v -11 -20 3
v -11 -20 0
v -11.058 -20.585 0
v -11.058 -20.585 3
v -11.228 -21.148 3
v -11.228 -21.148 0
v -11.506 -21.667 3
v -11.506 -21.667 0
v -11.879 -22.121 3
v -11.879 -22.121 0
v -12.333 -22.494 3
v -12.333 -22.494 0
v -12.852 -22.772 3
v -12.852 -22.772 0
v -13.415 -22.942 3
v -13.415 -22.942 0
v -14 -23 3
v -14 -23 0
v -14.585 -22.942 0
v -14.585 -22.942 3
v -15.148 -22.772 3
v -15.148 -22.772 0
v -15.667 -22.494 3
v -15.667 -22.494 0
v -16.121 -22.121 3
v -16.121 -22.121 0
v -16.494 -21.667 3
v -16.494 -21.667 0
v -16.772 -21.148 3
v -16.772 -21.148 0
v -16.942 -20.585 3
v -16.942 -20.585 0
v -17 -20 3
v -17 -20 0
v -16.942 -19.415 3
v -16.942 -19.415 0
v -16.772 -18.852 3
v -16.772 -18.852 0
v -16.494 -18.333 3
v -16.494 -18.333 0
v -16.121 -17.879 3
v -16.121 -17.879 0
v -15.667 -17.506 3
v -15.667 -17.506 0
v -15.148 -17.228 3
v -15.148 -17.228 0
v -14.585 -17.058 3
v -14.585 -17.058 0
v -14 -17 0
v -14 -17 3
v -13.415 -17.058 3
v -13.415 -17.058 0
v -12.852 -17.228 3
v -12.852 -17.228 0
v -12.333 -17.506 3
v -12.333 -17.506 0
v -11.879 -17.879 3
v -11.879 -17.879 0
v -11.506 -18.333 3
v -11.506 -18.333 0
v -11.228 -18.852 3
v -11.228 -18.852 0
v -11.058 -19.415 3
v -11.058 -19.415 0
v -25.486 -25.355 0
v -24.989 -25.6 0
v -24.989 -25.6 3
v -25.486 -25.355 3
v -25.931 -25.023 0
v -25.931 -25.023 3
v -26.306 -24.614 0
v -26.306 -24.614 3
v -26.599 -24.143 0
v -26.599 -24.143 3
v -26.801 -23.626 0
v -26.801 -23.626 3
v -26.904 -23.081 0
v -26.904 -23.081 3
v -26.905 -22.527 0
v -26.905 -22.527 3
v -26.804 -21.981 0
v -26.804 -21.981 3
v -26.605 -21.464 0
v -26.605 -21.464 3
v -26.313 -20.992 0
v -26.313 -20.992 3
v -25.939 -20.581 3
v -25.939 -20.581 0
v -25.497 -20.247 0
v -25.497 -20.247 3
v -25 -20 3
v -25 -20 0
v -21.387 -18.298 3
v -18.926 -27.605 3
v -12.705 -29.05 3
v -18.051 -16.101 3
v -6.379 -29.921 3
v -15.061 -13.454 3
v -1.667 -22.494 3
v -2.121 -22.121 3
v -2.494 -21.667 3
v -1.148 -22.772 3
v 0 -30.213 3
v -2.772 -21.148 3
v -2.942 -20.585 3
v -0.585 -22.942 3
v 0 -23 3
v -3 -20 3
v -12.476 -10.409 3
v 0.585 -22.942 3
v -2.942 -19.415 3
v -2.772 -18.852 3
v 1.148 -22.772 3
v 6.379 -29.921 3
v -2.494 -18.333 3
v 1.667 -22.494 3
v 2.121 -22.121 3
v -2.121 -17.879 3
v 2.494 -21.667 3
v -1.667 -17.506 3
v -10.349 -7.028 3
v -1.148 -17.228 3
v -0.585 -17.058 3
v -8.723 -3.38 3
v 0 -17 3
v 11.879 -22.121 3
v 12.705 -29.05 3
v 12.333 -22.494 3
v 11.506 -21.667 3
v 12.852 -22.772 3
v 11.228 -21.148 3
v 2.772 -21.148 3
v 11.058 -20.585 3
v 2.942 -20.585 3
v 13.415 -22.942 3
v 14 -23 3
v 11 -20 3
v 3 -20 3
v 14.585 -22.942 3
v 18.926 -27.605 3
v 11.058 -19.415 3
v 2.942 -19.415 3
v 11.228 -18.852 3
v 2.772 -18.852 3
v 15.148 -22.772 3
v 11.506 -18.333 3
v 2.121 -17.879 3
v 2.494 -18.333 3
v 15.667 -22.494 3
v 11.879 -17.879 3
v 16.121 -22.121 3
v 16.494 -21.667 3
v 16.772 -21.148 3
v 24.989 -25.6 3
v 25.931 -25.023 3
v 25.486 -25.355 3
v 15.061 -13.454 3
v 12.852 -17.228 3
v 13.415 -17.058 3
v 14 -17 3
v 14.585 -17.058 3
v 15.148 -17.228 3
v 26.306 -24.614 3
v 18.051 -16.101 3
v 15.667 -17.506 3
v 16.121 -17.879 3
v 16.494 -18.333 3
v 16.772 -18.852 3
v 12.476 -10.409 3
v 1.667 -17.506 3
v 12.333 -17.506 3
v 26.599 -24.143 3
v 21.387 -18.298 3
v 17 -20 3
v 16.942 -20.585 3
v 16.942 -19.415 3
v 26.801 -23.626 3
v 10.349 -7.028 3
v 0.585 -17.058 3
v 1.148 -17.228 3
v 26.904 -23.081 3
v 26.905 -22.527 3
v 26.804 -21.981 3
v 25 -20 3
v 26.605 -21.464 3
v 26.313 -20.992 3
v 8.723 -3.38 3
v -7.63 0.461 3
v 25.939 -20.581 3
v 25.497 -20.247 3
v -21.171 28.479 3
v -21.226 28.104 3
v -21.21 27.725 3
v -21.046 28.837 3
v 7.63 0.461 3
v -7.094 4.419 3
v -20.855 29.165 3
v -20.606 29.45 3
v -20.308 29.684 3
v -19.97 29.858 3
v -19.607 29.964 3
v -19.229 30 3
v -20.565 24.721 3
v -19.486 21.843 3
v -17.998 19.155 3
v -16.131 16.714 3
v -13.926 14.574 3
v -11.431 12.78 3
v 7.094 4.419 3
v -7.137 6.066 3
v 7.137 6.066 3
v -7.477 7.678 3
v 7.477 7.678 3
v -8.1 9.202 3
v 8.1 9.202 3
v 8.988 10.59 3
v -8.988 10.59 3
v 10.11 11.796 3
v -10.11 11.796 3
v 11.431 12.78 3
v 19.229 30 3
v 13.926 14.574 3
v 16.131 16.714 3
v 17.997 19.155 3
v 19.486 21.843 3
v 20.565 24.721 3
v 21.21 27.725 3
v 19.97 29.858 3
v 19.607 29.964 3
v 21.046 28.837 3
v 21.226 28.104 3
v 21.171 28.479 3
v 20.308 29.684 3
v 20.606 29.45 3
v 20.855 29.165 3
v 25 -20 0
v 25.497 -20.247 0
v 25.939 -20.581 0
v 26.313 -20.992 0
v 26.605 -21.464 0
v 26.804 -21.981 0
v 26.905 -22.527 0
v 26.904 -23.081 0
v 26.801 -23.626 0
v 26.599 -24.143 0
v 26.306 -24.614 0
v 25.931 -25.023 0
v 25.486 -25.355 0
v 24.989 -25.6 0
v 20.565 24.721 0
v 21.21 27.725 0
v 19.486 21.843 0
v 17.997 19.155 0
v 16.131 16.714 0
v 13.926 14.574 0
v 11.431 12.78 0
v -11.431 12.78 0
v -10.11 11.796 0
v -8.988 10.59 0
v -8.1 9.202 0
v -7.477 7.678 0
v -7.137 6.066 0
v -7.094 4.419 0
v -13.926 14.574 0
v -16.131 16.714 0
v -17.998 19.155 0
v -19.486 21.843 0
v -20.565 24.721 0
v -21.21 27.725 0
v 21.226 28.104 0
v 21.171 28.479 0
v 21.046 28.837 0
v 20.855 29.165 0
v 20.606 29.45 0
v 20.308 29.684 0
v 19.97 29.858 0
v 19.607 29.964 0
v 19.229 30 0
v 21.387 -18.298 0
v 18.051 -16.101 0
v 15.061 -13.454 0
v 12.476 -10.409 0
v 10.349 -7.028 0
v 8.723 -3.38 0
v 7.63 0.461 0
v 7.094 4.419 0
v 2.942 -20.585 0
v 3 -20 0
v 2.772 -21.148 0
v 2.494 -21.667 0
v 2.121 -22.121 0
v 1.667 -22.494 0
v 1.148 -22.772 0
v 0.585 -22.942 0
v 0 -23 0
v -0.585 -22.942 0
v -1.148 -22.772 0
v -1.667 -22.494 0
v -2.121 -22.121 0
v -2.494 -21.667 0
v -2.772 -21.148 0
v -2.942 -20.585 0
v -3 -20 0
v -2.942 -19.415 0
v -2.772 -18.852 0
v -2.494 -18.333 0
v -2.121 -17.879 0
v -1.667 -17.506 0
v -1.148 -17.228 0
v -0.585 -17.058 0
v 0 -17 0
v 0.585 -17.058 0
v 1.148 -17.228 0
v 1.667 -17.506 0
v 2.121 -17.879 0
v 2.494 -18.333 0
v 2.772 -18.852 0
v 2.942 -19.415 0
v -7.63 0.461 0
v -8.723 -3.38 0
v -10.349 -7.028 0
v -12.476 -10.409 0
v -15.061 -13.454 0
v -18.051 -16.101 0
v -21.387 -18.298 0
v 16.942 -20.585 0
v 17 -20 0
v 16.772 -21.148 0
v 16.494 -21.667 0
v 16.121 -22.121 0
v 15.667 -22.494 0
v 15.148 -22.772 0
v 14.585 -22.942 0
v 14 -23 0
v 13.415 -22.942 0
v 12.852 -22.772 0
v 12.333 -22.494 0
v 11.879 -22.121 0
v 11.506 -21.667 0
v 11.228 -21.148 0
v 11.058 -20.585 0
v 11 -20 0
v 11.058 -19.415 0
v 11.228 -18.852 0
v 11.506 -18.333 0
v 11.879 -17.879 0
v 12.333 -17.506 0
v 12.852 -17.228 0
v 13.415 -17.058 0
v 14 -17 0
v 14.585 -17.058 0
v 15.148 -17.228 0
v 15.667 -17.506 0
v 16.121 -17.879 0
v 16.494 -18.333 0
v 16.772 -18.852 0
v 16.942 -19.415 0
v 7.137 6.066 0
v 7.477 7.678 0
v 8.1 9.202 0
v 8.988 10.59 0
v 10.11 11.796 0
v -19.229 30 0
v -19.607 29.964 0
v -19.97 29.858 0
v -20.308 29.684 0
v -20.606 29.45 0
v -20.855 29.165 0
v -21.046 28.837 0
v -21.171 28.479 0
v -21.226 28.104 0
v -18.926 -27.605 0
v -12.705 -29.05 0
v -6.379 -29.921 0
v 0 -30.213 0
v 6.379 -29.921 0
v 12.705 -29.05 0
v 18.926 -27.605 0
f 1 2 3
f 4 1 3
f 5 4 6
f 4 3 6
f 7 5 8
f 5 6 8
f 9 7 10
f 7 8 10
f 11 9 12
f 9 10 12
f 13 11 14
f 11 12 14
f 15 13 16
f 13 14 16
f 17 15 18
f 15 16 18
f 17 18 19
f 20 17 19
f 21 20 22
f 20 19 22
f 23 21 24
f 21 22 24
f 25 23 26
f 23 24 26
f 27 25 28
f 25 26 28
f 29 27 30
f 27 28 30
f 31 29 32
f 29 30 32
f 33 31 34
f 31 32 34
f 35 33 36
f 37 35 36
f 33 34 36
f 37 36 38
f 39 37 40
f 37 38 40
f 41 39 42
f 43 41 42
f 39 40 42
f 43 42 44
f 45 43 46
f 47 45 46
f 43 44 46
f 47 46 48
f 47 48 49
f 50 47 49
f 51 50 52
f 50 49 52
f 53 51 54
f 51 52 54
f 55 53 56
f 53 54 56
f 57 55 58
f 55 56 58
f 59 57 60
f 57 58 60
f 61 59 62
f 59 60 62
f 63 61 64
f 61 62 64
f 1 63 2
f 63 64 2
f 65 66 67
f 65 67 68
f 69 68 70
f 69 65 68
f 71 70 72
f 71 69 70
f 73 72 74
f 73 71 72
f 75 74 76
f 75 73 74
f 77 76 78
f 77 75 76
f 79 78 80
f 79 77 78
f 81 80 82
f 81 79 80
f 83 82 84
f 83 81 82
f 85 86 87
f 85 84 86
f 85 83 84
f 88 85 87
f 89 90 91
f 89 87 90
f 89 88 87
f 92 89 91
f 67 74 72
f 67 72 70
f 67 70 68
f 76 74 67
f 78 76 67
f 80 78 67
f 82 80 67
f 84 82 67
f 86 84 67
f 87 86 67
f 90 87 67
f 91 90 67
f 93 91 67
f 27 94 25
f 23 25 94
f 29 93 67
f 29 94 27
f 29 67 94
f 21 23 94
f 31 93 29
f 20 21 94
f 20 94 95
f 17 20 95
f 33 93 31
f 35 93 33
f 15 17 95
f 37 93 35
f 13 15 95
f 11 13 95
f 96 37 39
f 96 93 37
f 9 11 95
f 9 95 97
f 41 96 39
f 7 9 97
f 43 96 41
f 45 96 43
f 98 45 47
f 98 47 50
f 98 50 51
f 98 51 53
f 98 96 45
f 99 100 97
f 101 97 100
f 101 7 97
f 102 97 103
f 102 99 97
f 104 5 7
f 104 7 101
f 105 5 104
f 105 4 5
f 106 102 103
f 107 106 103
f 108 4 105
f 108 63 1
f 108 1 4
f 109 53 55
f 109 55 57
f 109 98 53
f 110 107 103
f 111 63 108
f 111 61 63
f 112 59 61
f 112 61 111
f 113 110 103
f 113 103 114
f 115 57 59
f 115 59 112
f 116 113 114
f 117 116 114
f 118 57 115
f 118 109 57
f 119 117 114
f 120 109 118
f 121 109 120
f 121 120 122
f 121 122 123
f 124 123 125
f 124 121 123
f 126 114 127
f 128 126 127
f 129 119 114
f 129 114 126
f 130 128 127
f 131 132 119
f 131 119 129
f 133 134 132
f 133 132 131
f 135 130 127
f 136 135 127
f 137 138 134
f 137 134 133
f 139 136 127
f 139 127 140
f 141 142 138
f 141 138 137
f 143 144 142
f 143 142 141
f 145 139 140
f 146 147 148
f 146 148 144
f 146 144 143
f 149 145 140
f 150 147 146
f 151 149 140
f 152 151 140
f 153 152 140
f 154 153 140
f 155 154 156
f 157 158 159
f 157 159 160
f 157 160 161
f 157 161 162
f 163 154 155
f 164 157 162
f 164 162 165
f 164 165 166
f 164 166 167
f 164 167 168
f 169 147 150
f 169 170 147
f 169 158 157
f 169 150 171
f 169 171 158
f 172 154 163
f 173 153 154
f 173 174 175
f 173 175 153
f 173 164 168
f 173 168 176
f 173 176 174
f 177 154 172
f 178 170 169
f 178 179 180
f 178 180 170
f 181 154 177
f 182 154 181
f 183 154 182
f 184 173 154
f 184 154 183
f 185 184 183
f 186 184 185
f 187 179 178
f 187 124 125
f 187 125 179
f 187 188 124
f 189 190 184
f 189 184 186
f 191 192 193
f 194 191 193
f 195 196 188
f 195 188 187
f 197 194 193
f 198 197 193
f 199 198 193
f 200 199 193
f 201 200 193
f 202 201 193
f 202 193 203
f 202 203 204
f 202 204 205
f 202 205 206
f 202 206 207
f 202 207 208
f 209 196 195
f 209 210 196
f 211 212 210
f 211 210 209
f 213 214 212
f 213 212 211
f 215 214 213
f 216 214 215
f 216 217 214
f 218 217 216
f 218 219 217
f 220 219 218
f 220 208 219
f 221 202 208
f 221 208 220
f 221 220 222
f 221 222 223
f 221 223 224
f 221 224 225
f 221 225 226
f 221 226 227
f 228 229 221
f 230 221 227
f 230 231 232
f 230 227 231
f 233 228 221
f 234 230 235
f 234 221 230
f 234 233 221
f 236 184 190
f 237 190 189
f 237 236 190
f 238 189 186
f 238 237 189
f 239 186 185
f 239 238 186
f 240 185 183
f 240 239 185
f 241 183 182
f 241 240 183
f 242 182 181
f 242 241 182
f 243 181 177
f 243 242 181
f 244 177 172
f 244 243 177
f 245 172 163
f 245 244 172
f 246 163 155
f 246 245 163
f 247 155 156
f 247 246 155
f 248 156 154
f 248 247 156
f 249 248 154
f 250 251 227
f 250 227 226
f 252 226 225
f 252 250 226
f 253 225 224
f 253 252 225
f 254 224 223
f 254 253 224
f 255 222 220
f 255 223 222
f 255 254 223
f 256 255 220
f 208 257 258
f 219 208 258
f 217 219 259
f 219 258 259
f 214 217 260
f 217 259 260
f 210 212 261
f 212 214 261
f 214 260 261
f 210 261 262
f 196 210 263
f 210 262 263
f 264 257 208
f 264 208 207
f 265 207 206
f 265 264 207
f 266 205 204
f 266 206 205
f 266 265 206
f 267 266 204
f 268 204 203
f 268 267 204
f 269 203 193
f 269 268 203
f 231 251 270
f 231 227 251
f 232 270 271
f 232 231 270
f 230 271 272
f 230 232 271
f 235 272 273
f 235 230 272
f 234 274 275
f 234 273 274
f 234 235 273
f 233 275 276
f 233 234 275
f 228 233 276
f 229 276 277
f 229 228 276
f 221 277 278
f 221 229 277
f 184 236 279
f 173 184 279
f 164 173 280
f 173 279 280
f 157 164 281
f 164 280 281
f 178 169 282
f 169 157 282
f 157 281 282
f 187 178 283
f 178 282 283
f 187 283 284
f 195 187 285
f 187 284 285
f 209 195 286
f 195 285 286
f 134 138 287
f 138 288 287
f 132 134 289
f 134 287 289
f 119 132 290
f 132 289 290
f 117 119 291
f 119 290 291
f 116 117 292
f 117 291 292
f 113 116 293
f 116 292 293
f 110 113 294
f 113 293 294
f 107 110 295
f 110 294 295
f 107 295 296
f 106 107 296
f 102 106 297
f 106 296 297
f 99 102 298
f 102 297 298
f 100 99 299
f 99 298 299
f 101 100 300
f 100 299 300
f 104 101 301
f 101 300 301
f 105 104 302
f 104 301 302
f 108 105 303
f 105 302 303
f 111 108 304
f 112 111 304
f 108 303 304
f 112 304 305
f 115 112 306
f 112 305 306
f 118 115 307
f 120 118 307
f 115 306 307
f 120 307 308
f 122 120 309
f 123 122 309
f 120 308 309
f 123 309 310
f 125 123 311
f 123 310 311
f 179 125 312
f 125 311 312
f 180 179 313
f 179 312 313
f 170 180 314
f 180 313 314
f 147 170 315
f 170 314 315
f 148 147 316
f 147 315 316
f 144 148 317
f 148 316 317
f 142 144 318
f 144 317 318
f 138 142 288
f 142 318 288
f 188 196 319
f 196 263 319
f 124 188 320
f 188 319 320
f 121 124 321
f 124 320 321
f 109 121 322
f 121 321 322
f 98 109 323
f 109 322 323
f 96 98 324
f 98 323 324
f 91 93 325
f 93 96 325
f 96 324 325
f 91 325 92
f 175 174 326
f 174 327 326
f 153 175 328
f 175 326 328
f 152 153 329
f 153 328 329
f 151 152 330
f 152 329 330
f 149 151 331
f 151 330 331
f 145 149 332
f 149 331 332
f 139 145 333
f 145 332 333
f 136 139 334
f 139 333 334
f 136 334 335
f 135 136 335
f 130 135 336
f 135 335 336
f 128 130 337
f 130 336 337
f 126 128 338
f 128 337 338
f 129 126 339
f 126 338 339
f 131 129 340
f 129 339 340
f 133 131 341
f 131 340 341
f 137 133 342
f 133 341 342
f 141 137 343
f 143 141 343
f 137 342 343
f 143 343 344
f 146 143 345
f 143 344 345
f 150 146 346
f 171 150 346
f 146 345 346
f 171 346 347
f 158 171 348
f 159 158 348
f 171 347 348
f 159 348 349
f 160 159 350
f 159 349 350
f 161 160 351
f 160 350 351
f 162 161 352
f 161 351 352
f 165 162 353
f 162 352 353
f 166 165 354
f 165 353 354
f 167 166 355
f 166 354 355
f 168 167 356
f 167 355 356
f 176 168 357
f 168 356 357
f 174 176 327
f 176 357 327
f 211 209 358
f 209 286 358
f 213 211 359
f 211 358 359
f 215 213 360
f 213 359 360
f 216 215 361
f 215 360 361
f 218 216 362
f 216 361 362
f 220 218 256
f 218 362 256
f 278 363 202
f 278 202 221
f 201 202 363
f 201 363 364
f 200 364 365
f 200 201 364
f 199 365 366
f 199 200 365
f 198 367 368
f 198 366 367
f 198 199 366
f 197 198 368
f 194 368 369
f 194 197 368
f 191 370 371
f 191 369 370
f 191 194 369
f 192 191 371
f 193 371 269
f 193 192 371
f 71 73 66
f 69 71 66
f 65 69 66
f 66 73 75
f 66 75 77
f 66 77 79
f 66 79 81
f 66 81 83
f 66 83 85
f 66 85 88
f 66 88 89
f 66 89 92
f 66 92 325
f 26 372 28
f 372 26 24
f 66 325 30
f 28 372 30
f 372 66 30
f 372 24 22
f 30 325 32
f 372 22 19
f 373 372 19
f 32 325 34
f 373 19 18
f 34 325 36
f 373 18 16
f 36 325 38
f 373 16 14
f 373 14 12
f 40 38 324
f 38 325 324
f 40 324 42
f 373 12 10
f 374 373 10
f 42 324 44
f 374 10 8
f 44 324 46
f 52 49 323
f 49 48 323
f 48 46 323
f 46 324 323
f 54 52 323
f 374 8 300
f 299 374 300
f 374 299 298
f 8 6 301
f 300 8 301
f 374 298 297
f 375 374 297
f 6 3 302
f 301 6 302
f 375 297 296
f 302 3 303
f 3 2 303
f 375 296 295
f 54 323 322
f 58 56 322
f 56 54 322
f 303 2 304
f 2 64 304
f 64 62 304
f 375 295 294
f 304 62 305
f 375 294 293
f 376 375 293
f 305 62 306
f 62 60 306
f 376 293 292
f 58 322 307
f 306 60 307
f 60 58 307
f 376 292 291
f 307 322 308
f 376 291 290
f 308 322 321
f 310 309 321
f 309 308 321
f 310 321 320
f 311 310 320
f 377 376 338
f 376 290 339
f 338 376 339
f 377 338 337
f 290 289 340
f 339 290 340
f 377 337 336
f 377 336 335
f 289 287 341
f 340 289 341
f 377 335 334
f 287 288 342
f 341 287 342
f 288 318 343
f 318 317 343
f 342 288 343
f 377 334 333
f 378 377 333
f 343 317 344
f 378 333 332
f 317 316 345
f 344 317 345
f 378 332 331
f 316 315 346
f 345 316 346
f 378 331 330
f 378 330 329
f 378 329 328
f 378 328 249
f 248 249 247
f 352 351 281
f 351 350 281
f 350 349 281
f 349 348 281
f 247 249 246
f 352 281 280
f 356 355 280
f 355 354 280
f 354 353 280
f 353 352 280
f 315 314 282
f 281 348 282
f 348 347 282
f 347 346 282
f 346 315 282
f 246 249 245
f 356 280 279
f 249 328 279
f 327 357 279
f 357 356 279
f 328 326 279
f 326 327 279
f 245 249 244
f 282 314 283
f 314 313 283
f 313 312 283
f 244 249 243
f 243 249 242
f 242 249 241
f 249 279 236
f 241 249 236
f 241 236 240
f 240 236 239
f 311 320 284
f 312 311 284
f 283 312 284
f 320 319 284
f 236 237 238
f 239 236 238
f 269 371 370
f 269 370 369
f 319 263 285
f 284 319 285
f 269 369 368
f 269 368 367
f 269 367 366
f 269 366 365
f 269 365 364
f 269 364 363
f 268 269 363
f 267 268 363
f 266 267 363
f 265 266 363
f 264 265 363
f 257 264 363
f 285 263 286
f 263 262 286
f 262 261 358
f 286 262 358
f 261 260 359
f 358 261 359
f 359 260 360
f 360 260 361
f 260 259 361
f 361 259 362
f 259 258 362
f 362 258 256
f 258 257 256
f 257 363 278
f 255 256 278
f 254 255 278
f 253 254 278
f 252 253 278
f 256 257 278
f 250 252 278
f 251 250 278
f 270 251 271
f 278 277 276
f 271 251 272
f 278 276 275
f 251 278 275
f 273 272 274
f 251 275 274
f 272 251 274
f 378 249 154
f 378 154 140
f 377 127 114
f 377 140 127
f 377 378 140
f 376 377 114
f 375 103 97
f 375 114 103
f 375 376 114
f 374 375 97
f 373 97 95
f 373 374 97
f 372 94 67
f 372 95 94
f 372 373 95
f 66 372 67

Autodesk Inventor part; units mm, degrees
ref_plane "YZ Plane" through (0, 0, 0) normal (1, 0, 0) x (0, 1, 0)
ref_plane "XZ Plane" through (0, 0, 0) normal (0, 1, 0) x (-1, 0, 0)
ref_plane "XY Plane" through (0, 0, 0) normal (0, 0, 1) x (1, 0, 0)
sketch "Sketch1" plane through (0, 0, 0) normal (0, 0, 1) x (1, 0, 0)
  circle A0 centre (16.2, 5) radius 9.025
  arc A1 (15.9625, 14.0219) -> (35.7029, 29.6112) centre (15.41, 35.0146) ccw
  arc A2 (8.6866, 0) -> (52.5133, -3.5421) centre (31.9968, 15.5125) ccw
  circle A3 centre (16.2, 5) radius 6.025
  arc A4 (70.0205, 42.4797) -> (35.7029, 29.6112) centre (57.4454, 23.8218) ccw
  circle A5 centre (14, -20) radius 3
  circle A6 centre (0, -20) radius 3
  circle A7 centre (-14, -20) radius 3
  line L0 (16.2, 5) -> (136.0469, 5) construction
  line L1 (16.2, 5) -> (120.1794, 65.0325) construction
  line L2 (16.2, 5) -> (136.265, 5) construction
  line L3 (16.2, 5) -> (121.2083, -55.6266) construction
  line L4 (16.2, 5) -> (137.4531, 5) construction
  arc A8 (11.4834, 12.6944) -> (20.7844, 36.0654) centre (0.5085, 30.5984) ccw construction
  arc A9 (7.1931, 4.4289) -> (43.377, -20.5519) centre (35.1365, 6.208) ccw construction
  arc A10 (11.4312, 12.7797) -> (21.4, 30) centre (0.5085, 30.5984) ccw
  line L5 (21.4, 30) -> (0, 30)
  arc A11 (7.0935, 4.4191) -> (25, -20) centre (35.1365, 6.208) ccw
  arc A12 (11.4312, 12.7797) -> (7.0935, 4.4191) centre (16.2, 5) ccw
  line L6 (0, 30) -> (0, -48.3313) construction
  line L7 (-21.4, 30) -> (0, 30)
  arc A13 (-21.4, 30) -> (-11.4312, 12.7797) centre (-0.5085, 30.5984) ccw
  arc A14 (-7.0935, 4.4191) -> (-11.4312, 12.7797) centre (-16.2, 5) ccw
  arc A15 (-25, -20) -> (-7.0935, 4.4191) centre (-35.1365, 6.208) ccw
  line L8 (-36.0984, -20) -> (40.4938, -20)
  circle A16 centre (23.9178, -22.798) radius 3
  circle A17 centre (-23.9178, -22.798) radius 3
  arc A18 (-24.9888, -25.6003) -> (24.9888, -25.6003) centre (0, 39.7874) ccw
  line L9 (-31.4755, -75) -> (165.3406, -75) construction
  point P0 (0, 0)
  point P1 (25.2806, -20)
  point P2 (-25.2806, -20)
  point P3 (-20.9441, -22.4019)
  point P4 (28.425, 18.534)
  dimension "d0" = 6
  dimension "d1" = 6
  dimension "d2" = 6
  dimension "d3" = 30
  dimension "d4" = 30
  dimension "d5" = 0.1
  dimension "d6" = 0.1
  dimension "d7" = 20.9
  dimension "d8" = 9.125
  dimension "d9" = 30
  dimension "d10" = 20
  dimension "d11" = 21.4
  dimension "d12" = 28
  dimension "d13" = 6
  dimension "d14" = 6
  dimension "d15" = 70
  dimension "d16" = 14
  dimension "d17" = 14
  dimension "d18" = 25
  dimension "d19" = 75
extrude "Extrusion1" add sketch "Sketch1" along normal blind 3 contours L8 A16 A18 A17 A7 A6 A5 | A5 L8 A6 A7 A17 A15 A14 A13 L7 L5 A10 A12 A11 A16 | A16 L8 | L8 A16 | A17 L8 | A17 L8
fillet "Fillet1" radius 2 2 edges at (21.4, 30, 1.5) (-21.4, 30, 1.5)
properties part number "中間ユニット外"
